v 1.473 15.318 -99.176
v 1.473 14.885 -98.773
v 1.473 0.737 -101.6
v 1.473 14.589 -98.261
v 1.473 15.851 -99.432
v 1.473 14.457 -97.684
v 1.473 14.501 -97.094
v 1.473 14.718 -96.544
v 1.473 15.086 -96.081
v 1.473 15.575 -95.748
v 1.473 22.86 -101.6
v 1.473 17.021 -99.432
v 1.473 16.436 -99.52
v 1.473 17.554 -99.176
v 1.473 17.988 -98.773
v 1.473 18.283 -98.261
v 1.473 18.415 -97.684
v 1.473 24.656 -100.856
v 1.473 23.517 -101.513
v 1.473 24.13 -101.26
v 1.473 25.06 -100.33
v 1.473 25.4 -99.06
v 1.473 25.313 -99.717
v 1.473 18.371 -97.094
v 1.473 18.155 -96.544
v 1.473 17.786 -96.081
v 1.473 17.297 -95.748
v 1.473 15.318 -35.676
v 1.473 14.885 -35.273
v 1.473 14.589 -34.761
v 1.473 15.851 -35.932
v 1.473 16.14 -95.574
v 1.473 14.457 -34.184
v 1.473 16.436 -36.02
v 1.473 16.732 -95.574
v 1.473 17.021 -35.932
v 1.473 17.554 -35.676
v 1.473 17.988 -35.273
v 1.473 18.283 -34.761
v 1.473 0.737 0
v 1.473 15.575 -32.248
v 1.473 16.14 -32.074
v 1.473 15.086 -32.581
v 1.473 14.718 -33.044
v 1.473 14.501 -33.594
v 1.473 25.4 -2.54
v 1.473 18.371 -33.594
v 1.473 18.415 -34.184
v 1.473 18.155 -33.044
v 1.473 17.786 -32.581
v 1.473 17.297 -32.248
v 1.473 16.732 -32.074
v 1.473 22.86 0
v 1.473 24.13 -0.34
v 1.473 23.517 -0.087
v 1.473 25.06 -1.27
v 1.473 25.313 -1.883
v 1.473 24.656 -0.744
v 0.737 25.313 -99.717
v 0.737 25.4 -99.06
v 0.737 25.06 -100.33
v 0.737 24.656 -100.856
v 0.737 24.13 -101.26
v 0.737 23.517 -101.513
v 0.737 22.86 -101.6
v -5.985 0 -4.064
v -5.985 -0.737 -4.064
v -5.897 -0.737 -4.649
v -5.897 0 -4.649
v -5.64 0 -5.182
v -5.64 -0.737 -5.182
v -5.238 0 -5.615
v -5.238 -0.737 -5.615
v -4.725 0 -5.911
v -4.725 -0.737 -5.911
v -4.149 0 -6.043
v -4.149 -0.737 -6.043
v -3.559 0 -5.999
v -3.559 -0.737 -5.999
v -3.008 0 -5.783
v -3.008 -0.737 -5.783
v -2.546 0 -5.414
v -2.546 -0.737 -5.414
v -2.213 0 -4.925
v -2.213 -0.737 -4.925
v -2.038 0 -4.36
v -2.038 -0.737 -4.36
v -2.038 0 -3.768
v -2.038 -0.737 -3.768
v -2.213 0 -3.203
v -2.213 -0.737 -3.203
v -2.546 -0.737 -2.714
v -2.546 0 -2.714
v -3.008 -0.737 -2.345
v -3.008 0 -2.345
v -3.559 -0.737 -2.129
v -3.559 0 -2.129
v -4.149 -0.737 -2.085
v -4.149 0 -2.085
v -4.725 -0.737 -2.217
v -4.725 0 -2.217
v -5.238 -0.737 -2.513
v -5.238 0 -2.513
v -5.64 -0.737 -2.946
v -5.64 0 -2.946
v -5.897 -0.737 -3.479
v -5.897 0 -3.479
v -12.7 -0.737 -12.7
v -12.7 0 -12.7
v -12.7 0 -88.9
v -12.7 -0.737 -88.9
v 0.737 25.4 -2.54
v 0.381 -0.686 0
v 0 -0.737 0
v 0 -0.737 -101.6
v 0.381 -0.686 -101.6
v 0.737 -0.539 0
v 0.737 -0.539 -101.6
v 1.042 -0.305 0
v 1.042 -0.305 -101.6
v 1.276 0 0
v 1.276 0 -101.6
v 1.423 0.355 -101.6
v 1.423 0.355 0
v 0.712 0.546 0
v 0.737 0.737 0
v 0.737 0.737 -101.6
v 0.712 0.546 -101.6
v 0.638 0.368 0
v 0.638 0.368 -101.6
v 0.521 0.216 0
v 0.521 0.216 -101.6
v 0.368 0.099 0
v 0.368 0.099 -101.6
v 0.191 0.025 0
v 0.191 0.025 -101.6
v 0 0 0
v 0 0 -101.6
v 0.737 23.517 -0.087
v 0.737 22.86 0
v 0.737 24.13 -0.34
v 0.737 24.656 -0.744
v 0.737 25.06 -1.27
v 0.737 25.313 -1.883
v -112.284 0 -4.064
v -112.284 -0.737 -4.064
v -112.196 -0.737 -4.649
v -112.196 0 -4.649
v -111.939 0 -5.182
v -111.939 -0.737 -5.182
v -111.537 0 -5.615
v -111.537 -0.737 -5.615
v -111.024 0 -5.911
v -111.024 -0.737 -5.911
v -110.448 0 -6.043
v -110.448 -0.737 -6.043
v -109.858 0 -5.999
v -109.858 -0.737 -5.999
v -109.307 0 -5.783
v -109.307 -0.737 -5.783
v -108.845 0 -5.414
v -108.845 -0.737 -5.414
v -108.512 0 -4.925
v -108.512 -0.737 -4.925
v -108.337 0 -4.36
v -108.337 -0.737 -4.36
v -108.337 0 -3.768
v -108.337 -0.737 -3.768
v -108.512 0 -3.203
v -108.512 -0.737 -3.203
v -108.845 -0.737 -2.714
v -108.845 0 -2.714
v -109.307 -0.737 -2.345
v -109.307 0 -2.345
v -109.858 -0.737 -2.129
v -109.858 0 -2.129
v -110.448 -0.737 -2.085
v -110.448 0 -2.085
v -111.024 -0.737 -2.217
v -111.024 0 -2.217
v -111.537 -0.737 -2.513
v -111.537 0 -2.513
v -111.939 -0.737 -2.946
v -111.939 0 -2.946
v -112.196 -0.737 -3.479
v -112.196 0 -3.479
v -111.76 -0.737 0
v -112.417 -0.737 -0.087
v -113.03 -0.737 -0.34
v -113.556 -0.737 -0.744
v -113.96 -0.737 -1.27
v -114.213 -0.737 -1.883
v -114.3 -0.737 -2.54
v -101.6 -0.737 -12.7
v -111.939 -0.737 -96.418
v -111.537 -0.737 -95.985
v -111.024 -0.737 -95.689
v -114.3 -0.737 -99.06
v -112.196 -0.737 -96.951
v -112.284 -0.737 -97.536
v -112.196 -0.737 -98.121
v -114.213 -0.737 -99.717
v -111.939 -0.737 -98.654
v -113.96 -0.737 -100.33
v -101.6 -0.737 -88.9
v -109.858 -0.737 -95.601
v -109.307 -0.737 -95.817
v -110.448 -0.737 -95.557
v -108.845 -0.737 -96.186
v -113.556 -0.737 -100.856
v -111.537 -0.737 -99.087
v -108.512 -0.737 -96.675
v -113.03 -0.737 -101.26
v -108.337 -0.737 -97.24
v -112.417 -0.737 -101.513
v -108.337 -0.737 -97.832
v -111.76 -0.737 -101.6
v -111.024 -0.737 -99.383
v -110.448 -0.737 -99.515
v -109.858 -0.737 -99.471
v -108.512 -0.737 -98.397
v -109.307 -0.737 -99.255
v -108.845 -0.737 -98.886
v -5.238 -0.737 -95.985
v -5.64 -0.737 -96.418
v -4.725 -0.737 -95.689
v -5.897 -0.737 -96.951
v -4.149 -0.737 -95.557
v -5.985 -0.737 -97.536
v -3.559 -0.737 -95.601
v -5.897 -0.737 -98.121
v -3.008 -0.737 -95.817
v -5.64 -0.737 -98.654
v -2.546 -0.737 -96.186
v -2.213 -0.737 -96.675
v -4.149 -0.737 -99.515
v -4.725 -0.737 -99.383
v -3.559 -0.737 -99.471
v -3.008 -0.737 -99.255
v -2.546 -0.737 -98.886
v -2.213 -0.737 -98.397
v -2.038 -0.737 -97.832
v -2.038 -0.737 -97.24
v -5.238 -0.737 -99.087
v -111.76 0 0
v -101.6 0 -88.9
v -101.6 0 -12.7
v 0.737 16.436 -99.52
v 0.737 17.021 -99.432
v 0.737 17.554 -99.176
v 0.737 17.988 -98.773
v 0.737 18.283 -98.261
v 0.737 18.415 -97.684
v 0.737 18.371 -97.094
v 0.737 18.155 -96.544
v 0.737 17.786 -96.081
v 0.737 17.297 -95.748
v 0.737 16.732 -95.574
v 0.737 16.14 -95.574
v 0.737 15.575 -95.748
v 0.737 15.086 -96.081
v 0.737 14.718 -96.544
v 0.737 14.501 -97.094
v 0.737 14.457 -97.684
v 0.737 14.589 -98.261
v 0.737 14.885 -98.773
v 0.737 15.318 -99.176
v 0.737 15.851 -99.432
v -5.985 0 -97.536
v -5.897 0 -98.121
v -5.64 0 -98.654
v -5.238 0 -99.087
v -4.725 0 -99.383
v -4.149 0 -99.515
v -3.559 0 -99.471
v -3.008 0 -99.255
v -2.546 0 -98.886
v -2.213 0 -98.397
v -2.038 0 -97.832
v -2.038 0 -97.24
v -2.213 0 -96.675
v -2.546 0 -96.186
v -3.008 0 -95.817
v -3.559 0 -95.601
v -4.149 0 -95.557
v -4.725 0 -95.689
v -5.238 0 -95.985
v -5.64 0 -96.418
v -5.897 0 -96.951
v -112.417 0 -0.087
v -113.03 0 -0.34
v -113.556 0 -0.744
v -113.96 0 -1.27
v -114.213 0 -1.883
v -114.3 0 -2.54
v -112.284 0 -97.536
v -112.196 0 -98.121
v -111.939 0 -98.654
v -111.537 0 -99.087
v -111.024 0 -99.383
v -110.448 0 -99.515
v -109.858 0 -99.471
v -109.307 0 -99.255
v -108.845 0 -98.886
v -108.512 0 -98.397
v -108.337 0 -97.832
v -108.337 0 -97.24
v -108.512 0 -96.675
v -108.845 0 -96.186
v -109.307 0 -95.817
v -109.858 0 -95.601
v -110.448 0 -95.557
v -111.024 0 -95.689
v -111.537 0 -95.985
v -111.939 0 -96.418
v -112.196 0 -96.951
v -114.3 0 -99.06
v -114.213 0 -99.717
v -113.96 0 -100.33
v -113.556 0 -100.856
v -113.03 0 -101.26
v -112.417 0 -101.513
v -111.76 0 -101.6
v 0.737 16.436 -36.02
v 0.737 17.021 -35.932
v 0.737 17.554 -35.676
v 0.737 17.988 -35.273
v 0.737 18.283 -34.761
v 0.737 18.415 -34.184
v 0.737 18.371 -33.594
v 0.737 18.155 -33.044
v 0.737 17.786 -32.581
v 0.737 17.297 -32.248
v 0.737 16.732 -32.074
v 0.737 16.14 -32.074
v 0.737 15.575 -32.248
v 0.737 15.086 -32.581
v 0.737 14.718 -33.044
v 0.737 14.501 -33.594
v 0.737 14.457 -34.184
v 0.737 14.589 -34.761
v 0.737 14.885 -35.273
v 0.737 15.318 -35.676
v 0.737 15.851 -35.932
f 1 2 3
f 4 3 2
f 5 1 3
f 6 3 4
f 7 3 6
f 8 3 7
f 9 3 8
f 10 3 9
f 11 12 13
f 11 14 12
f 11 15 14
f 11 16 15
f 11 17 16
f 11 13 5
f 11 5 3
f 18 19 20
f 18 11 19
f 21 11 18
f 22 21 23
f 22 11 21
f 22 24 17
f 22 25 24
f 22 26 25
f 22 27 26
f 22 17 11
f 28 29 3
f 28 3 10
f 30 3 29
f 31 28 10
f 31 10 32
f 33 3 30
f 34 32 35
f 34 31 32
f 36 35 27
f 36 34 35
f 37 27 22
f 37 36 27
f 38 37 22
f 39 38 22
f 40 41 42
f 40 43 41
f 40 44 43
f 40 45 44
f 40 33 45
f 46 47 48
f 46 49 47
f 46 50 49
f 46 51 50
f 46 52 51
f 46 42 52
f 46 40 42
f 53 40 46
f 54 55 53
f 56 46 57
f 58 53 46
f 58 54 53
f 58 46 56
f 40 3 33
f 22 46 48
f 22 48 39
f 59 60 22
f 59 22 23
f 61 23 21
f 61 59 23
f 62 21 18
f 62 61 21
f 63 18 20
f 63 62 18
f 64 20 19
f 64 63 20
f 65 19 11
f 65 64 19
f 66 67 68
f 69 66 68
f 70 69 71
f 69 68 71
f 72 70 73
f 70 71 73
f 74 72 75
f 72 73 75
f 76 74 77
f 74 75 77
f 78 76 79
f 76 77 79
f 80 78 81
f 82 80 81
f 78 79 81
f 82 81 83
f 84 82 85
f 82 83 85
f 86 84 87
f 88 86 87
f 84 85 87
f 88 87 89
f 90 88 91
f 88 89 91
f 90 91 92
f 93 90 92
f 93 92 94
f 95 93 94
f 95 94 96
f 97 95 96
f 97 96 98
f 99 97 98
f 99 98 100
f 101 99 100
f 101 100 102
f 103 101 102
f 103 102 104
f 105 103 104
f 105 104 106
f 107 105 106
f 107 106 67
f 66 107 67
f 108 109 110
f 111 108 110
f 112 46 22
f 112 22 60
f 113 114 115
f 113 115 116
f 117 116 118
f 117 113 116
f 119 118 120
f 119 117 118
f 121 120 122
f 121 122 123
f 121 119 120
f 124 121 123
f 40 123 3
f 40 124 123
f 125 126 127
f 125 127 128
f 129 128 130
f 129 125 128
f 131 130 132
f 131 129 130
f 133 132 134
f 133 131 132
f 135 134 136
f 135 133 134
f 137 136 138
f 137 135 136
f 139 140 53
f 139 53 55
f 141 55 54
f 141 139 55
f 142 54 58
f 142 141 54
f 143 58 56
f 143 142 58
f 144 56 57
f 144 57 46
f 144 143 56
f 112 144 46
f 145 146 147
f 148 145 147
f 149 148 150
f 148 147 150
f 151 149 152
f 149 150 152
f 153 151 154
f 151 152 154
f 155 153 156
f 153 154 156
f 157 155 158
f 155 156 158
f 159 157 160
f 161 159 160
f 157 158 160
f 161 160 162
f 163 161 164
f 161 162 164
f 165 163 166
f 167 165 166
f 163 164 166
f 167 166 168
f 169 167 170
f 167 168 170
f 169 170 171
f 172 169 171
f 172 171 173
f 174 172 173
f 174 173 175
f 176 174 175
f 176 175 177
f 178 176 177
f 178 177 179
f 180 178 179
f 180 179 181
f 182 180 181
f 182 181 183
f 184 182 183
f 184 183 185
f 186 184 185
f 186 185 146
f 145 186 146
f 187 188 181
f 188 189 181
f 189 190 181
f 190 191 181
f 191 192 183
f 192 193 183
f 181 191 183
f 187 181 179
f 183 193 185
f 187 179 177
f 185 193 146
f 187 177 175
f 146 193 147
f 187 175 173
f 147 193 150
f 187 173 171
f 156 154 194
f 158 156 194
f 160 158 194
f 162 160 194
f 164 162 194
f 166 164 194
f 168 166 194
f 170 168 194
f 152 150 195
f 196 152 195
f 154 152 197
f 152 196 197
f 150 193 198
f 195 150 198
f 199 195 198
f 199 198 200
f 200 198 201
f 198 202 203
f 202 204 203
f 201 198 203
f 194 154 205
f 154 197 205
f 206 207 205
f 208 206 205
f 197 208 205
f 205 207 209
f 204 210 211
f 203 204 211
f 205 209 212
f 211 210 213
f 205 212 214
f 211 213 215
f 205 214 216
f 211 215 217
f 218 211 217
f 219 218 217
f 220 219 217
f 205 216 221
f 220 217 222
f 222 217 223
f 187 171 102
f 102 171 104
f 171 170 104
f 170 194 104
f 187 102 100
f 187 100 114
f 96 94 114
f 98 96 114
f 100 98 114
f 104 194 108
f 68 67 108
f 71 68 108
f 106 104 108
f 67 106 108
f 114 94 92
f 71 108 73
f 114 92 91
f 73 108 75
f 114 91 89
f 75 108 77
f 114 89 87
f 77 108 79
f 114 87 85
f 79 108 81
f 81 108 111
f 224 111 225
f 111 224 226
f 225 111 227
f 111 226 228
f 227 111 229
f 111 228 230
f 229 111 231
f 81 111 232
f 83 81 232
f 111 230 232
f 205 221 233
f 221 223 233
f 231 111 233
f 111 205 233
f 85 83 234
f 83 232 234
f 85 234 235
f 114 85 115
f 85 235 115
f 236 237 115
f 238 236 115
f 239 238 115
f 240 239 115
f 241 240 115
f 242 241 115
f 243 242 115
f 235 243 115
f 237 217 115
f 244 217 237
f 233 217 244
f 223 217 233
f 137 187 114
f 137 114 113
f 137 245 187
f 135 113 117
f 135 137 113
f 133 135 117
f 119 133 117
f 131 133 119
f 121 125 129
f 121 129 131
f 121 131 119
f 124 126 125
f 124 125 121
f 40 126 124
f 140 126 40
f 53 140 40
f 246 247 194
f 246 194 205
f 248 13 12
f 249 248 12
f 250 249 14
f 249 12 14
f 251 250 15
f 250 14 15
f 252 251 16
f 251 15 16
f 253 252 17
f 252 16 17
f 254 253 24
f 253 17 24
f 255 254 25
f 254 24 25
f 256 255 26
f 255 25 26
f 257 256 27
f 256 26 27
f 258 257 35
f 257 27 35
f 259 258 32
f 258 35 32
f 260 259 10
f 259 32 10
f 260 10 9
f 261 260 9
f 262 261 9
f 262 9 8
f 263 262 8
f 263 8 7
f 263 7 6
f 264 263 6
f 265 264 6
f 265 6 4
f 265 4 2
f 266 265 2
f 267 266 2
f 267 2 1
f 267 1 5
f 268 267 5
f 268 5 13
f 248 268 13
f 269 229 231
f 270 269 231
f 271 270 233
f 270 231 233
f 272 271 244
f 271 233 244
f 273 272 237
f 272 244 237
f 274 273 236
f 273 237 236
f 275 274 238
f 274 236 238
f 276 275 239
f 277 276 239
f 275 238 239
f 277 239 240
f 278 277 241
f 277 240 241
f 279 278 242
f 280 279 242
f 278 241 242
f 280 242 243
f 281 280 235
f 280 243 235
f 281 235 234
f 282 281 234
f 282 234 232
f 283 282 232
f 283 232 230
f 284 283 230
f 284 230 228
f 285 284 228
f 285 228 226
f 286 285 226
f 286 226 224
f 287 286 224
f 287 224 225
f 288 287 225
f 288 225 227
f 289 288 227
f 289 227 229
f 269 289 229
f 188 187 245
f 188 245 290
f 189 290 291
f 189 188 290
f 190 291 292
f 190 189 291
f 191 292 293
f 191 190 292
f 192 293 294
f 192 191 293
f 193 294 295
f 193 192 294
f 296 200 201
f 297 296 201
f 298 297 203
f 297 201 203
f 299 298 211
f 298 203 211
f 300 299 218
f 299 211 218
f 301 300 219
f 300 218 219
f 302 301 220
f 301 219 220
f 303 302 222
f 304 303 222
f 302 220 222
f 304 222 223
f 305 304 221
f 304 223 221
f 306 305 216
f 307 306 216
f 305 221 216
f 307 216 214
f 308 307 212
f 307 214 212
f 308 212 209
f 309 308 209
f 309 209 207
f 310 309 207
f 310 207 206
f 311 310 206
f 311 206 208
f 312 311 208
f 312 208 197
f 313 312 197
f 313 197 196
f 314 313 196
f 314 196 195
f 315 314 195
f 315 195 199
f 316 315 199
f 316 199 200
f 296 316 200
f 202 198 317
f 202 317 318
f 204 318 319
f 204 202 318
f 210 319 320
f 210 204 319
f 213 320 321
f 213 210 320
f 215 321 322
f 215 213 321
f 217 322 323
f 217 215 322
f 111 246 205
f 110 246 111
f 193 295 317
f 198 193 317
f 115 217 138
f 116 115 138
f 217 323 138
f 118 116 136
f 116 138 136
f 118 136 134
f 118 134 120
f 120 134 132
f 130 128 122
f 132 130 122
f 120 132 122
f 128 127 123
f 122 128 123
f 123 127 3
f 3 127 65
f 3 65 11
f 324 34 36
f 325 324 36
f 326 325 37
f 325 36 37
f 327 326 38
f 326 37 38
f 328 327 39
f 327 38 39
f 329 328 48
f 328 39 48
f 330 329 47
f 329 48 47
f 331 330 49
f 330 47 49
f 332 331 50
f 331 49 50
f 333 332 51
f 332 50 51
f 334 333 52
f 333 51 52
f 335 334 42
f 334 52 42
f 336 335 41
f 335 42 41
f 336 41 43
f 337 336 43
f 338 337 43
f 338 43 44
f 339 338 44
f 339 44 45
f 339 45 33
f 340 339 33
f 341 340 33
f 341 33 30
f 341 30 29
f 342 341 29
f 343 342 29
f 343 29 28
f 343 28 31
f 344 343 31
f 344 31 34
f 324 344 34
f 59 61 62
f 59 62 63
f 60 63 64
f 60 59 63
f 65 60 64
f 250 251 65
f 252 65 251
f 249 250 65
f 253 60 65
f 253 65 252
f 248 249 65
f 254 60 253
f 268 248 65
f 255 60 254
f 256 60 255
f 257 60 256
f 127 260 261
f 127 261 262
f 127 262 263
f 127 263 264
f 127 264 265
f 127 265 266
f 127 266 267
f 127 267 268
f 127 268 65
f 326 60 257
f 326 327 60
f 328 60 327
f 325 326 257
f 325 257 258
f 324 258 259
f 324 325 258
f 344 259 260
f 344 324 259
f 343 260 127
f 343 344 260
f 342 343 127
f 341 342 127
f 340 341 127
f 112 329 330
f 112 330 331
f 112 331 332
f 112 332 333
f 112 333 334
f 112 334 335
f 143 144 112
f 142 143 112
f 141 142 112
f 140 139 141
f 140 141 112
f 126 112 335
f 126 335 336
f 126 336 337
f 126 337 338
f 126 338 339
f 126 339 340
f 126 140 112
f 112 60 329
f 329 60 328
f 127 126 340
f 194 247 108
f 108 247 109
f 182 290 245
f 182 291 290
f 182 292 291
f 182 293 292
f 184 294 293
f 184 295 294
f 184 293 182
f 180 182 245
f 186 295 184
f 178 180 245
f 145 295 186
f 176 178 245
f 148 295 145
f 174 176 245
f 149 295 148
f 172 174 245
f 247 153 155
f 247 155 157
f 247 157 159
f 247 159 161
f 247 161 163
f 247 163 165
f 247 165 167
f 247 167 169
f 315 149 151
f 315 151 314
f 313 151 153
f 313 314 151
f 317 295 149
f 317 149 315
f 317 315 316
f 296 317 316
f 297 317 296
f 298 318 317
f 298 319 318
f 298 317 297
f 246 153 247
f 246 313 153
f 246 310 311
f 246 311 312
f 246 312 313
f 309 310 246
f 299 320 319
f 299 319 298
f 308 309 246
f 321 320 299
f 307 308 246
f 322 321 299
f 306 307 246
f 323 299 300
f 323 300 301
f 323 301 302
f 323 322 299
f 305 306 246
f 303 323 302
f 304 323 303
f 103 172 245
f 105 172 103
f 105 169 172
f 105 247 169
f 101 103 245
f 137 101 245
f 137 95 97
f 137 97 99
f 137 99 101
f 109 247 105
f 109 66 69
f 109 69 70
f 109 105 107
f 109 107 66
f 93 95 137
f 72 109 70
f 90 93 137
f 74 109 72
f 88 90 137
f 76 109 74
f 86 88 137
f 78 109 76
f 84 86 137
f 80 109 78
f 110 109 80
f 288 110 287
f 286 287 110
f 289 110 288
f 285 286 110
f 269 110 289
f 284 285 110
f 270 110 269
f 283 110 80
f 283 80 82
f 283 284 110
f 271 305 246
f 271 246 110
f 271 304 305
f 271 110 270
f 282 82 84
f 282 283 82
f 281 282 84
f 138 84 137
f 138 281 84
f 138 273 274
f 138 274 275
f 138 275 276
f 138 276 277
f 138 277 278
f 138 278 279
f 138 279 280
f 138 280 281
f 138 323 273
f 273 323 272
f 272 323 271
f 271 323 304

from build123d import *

# Parameters (mm, degrees)
SKETCH1_W                       = 114.3
SKETCH1_H                       = 101.6
BASE_FLANGE2_DEPTH              = 0.7366
EDGE_FLANGE1_DEPTH              = 101.6
F_5_32_0_15625_DIAMETER_HOLE1_D = 3.96875
F_5_32_0_15625_DIAMETER_HOLE2_D = 3.96875
SKETCH13_W                      = 88.9
SKETCH13_H                      = 76.2
CUT_EXTRUDE1_DEPTH              = 156.02325632
BREAK_CORNER1_START             = 0.7366
BREAK_CORNER1_DEPTH             = 0.7366
BREAK_CORNER1_START_2           = -0.7366
BREAK_CORNER1_2_DEPTH           = 0.7366


# Read off the part's stored shape, not the designer's step: Break-Corner1
# Sheet-metal steps are written as plain solids
with BuildPart() as part:
    # Sketch1 → Base-Flange2 (new body)
    with BuildSketch(Plane(origin=(0, 0, 0), x_dir=(1, 0, 0), z_dir=(0, 1, 0))):
        with Locations((-57.15, 50.8)):
            Rectangle(SKETCH1_W, SKETCH1_H)
    extrude(amount=-BASE_FLANGE2_DEPTH)

    # Edge-Flange1 section (across the edge) → Edge-Flange1 (add)
    with BuildSketch(Plane(origin=(0.7366, 0, 0), x_dir=(-1, 0, 0), z_dir=(0, 0, -1))):
        with BuildLine():
            Line((-0.7366, 0.7366), (-0.7366, 25.4))
            Line((-0.7366, 25.4), (0, 25.4))
            Line((0, 25.4), (0, 0.7366))
            ThreePointArc((0, 0.7366), (0.215745145, 0.215745145), (0.7366, 0))
            Line((0.7366, 0), (0.7366, -0.7366))
            ThreePointArc((0.7366, -0.7366), (-0.30510971, -0.30510971), (-0.7366, 0.7366))
        make_face()
    extrude(amount=EDGE_FLANGE1_DEPTH)

    # 5/32 (0.15625) Diameter Hole1 (through all)
    with Locations(Plane(origin=(0, 0, 0), x_dir=(1, 0, 0), z_dir=(0, 1, 0))):
        with Locations((-110.2995, 4.064), (-110.2995, 97.536), (-4.0005, 97.536), (-4.0005, 4.064)):
            Hole(F_5_32_0_15625_DIAMETER_HOLE1_D / 2)

    # 5/32 (0.15625) Diameter Hole2 (through all)
    with Locations(Plane.ZY.offset(-0.7366)):
        with Locations((-34.036, 16.436061869), (-97.536, 16.436061869)):
            Hole(F_5_32_0_15625_DIAMETER_HOLE2_D / 2)

    # Sketch13 → Cut-Extrude1 (cut, through all)
    with BuildSketch(Plane(origin=(0, 0, 0), x_dir=(1, 0, 0), z_dir=(0, 1, 0))):
        with Locations((-57.15, 50.8)):
            Rectangle(SKETCH13_W, SKETCH13_H)
    extrude(amount=-CUT_EXTRUDE1_DEPTH, mode=Mode.SUBTRACT)

    # Break-Corner1 outline → Break-Corner1 (cut)
    with BuildSketch(Plane.YZ.offset(BREAK_CORNER1_START)):
        with BuildLine():
            Line((25.4, 0), (22.86, 0))
            ThreePointArc((22.86, 0), (24.656051224, -0.743948776), (25.4, -2.54))
            Line((25.4, -2.54), (25.4, 0))
        make_face()
        with BuildLine():
            Line((25.4, -101.6), (25.4, -99.06))
            ThreePointArc((25.4, -99.06), (24.656051224, -100.856051224), (22.86, -101.6))
            Line((22.86, -101.6), (25.4, -101.6))
        make_face()
    extrude(amount=BREAK_CORNER1_DEPTH, mode=Mode.SUBTRACT)

    # Break-Corner1 2 outline → Break-Corner1 2 (cut)
    with BuildSketch(Plane(origin=(0, 0, 0), x_dir=(1, 0, 0), z_dir=(0, 1, 0)).offset(BREAK_CORNER1_START_2)):
        with BuildLine():
            Line((-114.3, 101.6), (-114.3, 99.06))
            ThreePointArc((-114.3, 99.06), (-113.556051224, 100.856051224), (-111.76, 101.6))
            Line((-111.76, 101.6), (-114.3, 101.6))
        make_face()
        with BuildLine():
            ThreePointArc((-111.76, 0), (-113.556051224, 0.743948776), (-114.3, 2.54))
            Line((-114.3, 2.54), (-114.3, 0))
            Line((-114.3, 0), (-111.76, 0))
        make_face()
    extrude(amount=BREAK_CORNER1_2_DEPTH, mode=Mode.SUBTRACT)


solid = part.part
